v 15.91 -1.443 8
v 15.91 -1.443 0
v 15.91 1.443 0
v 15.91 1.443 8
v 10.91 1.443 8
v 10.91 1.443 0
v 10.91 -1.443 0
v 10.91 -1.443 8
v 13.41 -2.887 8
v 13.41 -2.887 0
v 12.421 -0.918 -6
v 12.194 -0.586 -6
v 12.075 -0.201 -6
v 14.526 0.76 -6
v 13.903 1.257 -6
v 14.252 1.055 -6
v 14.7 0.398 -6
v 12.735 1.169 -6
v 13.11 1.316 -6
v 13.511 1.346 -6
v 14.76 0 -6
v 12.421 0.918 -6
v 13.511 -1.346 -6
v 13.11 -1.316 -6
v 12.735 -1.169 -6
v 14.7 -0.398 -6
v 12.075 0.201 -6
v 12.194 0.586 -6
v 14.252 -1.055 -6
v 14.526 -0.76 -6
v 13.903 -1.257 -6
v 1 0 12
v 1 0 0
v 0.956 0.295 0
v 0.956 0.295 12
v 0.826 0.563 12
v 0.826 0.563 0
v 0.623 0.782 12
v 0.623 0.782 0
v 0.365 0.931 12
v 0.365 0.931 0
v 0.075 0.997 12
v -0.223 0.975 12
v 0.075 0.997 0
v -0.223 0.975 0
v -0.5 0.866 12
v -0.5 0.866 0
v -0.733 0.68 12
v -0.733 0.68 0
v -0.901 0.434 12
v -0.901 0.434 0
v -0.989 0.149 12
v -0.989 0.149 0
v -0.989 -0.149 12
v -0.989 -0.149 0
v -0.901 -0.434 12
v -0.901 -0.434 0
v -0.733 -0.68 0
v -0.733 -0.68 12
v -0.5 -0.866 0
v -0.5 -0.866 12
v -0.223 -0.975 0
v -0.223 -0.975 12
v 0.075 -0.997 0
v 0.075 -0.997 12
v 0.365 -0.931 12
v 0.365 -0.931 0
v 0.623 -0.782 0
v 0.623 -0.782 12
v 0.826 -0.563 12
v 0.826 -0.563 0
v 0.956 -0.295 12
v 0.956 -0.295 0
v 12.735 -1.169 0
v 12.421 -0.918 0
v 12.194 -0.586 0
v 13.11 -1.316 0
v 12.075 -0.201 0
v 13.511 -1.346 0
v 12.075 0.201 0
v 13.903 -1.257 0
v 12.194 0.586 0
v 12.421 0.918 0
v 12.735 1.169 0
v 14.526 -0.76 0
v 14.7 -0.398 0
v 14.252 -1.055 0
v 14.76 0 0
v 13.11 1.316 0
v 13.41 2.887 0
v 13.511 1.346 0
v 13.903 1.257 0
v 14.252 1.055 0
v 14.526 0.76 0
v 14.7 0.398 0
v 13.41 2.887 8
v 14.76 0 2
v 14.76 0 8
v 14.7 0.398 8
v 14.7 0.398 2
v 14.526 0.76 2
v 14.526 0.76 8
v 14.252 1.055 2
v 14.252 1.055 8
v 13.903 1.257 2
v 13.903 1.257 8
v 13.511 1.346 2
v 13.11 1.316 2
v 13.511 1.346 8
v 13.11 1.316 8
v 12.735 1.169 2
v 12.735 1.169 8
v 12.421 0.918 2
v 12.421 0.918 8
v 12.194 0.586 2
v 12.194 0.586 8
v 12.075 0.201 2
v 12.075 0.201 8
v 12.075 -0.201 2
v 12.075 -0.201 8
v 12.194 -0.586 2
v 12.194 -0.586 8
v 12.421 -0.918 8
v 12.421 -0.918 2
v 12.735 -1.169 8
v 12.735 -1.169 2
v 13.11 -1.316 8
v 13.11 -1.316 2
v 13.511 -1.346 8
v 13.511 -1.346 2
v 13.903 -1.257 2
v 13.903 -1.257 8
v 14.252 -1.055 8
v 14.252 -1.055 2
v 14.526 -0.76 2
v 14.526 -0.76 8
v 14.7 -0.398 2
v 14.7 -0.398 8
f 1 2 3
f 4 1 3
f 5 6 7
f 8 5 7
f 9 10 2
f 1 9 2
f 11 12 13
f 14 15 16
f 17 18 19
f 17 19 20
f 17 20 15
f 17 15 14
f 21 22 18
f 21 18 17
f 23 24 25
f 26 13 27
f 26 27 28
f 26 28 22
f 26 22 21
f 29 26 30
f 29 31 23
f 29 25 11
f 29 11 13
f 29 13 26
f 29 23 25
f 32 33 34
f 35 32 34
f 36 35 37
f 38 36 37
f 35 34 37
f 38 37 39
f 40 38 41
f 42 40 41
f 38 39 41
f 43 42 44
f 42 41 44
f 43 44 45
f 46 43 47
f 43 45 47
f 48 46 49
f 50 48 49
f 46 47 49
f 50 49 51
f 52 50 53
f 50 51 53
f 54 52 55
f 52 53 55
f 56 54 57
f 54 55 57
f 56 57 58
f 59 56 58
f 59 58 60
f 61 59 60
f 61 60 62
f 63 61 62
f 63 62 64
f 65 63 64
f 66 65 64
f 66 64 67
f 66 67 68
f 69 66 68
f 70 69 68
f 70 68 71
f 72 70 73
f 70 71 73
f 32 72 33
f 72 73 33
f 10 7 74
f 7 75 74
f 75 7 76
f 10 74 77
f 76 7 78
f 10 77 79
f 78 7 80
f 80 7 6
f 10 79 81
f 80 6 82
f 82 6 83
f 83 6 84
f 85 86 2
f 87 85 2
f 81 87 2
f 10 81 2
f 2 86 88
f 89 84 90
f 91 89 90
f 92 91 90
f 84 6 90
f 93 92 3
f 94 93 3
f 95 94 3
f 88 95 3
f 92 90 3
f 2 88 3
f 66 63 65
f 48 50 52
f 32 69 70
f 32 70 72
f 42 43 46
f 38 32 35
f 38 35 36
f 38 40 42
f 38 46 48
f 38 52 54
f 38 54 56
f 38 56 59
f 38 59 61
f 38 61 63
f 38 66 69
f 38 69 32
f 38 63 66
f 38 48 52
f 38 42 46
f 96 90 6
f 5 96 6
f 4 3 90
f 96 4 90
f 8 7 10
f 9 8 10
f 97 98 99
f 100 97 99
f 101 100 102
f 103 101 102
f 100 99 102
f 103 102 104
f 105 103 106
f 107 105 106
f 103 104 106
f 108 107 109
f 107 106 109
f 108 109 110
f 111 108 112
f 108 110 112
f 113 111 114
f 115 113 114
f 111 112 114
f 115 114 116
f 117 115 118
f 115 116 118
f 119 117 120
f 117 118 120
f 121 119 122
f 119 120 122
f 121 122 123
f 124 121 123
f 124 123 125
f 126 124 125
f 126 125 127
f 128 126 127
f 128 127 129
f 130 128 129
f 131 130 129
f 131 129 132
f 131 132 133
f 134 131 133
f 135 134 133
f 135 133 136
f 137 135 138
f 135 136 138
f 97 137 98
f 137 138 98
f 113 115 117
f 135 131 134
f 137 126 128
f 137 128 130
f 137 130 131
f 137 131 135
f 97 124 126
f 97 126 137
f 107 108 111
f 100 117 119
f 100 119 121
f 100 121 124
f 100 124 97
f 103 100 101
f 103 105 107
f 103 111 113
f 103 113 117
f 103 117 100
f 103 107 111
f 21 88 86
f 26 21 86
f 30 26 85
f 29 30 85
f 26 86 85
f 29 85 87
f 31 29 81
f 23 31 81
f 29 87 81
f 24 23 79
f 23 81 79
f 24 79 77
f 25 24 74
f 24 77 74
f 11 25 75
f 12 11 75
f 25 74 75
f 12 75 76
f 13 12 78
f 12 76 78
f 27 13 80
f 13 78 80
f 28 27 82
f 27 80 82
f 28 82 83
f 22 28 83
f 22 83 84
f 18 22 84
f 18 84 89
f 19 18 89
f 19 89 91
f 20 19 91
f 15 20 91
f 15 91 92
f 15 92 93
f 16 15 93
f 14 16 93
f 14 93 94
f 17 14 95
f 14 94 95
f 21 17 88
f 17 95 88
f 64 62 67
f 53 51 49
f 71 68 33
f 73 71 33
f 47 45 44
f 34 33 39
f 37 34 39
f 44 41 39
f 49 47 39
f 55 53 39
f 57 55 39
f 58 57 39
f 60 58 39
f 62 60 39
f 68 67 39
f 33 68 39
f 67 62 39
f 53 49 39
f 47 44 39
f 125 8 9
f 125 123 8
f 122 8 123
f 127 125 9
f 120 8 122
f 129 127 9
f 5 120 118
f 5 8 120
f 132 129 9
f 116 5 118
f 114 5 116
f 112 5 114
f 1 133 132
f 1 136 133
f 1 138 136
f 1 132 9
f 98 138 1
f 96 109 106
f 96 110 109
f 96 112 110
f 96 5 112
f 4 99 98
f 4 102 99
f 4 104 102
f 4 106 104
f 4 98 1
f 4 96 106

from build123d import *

# Parameters (mm, degrees)
F0_R     = 1
F1_DEPTH = 12
F3_DEPTH = 8
F4_R     = 1.35
F5_DEPTH = 6
F6_R     = 1.35
F7_DEPTH = 6


with BuildPart() as f1:
    # F0 (on Top) → F1 (new body)
    with BuildSketch(Plane.XY):
        Circle(F0_R)
    extrude(amount=F1_DEPTH)


with BuildPart() as f3:
    # F2 (on Top) → F3 (new body)
    with BuildSketch(Plane.XY):
        Polygon((15.910226, -1.443376), (15.910226, 1.443376), (13.410226, 2.886751), (10.910226, 1.443376), (10.910226, -1.443376), (13.410226, -2.886751), align=None)
    extrude(amount=F3_DEPTH)

    # F4 (on face) → F5 (cut)
    with BuildSketch(Plane.XY.offset(8)):
        with Locations((13.410226, 0)):
            Circle(F4_R)
    extrude(amount=-F5_DEPTH, mode=Mode.SUBTRACT)

    # F6 (on face) → F7 (join)
    with BuildSketch(Plane(origin=(0, 0, 0), x_dir=(1, 0, 0), z_dir=(0, 0, -1))):
        with Locations((13.410226, 0)):
            Circle(F6_R)
    extrude(amount=F7_DEPTH)


solid = Compound([f1.part, f3.part])
